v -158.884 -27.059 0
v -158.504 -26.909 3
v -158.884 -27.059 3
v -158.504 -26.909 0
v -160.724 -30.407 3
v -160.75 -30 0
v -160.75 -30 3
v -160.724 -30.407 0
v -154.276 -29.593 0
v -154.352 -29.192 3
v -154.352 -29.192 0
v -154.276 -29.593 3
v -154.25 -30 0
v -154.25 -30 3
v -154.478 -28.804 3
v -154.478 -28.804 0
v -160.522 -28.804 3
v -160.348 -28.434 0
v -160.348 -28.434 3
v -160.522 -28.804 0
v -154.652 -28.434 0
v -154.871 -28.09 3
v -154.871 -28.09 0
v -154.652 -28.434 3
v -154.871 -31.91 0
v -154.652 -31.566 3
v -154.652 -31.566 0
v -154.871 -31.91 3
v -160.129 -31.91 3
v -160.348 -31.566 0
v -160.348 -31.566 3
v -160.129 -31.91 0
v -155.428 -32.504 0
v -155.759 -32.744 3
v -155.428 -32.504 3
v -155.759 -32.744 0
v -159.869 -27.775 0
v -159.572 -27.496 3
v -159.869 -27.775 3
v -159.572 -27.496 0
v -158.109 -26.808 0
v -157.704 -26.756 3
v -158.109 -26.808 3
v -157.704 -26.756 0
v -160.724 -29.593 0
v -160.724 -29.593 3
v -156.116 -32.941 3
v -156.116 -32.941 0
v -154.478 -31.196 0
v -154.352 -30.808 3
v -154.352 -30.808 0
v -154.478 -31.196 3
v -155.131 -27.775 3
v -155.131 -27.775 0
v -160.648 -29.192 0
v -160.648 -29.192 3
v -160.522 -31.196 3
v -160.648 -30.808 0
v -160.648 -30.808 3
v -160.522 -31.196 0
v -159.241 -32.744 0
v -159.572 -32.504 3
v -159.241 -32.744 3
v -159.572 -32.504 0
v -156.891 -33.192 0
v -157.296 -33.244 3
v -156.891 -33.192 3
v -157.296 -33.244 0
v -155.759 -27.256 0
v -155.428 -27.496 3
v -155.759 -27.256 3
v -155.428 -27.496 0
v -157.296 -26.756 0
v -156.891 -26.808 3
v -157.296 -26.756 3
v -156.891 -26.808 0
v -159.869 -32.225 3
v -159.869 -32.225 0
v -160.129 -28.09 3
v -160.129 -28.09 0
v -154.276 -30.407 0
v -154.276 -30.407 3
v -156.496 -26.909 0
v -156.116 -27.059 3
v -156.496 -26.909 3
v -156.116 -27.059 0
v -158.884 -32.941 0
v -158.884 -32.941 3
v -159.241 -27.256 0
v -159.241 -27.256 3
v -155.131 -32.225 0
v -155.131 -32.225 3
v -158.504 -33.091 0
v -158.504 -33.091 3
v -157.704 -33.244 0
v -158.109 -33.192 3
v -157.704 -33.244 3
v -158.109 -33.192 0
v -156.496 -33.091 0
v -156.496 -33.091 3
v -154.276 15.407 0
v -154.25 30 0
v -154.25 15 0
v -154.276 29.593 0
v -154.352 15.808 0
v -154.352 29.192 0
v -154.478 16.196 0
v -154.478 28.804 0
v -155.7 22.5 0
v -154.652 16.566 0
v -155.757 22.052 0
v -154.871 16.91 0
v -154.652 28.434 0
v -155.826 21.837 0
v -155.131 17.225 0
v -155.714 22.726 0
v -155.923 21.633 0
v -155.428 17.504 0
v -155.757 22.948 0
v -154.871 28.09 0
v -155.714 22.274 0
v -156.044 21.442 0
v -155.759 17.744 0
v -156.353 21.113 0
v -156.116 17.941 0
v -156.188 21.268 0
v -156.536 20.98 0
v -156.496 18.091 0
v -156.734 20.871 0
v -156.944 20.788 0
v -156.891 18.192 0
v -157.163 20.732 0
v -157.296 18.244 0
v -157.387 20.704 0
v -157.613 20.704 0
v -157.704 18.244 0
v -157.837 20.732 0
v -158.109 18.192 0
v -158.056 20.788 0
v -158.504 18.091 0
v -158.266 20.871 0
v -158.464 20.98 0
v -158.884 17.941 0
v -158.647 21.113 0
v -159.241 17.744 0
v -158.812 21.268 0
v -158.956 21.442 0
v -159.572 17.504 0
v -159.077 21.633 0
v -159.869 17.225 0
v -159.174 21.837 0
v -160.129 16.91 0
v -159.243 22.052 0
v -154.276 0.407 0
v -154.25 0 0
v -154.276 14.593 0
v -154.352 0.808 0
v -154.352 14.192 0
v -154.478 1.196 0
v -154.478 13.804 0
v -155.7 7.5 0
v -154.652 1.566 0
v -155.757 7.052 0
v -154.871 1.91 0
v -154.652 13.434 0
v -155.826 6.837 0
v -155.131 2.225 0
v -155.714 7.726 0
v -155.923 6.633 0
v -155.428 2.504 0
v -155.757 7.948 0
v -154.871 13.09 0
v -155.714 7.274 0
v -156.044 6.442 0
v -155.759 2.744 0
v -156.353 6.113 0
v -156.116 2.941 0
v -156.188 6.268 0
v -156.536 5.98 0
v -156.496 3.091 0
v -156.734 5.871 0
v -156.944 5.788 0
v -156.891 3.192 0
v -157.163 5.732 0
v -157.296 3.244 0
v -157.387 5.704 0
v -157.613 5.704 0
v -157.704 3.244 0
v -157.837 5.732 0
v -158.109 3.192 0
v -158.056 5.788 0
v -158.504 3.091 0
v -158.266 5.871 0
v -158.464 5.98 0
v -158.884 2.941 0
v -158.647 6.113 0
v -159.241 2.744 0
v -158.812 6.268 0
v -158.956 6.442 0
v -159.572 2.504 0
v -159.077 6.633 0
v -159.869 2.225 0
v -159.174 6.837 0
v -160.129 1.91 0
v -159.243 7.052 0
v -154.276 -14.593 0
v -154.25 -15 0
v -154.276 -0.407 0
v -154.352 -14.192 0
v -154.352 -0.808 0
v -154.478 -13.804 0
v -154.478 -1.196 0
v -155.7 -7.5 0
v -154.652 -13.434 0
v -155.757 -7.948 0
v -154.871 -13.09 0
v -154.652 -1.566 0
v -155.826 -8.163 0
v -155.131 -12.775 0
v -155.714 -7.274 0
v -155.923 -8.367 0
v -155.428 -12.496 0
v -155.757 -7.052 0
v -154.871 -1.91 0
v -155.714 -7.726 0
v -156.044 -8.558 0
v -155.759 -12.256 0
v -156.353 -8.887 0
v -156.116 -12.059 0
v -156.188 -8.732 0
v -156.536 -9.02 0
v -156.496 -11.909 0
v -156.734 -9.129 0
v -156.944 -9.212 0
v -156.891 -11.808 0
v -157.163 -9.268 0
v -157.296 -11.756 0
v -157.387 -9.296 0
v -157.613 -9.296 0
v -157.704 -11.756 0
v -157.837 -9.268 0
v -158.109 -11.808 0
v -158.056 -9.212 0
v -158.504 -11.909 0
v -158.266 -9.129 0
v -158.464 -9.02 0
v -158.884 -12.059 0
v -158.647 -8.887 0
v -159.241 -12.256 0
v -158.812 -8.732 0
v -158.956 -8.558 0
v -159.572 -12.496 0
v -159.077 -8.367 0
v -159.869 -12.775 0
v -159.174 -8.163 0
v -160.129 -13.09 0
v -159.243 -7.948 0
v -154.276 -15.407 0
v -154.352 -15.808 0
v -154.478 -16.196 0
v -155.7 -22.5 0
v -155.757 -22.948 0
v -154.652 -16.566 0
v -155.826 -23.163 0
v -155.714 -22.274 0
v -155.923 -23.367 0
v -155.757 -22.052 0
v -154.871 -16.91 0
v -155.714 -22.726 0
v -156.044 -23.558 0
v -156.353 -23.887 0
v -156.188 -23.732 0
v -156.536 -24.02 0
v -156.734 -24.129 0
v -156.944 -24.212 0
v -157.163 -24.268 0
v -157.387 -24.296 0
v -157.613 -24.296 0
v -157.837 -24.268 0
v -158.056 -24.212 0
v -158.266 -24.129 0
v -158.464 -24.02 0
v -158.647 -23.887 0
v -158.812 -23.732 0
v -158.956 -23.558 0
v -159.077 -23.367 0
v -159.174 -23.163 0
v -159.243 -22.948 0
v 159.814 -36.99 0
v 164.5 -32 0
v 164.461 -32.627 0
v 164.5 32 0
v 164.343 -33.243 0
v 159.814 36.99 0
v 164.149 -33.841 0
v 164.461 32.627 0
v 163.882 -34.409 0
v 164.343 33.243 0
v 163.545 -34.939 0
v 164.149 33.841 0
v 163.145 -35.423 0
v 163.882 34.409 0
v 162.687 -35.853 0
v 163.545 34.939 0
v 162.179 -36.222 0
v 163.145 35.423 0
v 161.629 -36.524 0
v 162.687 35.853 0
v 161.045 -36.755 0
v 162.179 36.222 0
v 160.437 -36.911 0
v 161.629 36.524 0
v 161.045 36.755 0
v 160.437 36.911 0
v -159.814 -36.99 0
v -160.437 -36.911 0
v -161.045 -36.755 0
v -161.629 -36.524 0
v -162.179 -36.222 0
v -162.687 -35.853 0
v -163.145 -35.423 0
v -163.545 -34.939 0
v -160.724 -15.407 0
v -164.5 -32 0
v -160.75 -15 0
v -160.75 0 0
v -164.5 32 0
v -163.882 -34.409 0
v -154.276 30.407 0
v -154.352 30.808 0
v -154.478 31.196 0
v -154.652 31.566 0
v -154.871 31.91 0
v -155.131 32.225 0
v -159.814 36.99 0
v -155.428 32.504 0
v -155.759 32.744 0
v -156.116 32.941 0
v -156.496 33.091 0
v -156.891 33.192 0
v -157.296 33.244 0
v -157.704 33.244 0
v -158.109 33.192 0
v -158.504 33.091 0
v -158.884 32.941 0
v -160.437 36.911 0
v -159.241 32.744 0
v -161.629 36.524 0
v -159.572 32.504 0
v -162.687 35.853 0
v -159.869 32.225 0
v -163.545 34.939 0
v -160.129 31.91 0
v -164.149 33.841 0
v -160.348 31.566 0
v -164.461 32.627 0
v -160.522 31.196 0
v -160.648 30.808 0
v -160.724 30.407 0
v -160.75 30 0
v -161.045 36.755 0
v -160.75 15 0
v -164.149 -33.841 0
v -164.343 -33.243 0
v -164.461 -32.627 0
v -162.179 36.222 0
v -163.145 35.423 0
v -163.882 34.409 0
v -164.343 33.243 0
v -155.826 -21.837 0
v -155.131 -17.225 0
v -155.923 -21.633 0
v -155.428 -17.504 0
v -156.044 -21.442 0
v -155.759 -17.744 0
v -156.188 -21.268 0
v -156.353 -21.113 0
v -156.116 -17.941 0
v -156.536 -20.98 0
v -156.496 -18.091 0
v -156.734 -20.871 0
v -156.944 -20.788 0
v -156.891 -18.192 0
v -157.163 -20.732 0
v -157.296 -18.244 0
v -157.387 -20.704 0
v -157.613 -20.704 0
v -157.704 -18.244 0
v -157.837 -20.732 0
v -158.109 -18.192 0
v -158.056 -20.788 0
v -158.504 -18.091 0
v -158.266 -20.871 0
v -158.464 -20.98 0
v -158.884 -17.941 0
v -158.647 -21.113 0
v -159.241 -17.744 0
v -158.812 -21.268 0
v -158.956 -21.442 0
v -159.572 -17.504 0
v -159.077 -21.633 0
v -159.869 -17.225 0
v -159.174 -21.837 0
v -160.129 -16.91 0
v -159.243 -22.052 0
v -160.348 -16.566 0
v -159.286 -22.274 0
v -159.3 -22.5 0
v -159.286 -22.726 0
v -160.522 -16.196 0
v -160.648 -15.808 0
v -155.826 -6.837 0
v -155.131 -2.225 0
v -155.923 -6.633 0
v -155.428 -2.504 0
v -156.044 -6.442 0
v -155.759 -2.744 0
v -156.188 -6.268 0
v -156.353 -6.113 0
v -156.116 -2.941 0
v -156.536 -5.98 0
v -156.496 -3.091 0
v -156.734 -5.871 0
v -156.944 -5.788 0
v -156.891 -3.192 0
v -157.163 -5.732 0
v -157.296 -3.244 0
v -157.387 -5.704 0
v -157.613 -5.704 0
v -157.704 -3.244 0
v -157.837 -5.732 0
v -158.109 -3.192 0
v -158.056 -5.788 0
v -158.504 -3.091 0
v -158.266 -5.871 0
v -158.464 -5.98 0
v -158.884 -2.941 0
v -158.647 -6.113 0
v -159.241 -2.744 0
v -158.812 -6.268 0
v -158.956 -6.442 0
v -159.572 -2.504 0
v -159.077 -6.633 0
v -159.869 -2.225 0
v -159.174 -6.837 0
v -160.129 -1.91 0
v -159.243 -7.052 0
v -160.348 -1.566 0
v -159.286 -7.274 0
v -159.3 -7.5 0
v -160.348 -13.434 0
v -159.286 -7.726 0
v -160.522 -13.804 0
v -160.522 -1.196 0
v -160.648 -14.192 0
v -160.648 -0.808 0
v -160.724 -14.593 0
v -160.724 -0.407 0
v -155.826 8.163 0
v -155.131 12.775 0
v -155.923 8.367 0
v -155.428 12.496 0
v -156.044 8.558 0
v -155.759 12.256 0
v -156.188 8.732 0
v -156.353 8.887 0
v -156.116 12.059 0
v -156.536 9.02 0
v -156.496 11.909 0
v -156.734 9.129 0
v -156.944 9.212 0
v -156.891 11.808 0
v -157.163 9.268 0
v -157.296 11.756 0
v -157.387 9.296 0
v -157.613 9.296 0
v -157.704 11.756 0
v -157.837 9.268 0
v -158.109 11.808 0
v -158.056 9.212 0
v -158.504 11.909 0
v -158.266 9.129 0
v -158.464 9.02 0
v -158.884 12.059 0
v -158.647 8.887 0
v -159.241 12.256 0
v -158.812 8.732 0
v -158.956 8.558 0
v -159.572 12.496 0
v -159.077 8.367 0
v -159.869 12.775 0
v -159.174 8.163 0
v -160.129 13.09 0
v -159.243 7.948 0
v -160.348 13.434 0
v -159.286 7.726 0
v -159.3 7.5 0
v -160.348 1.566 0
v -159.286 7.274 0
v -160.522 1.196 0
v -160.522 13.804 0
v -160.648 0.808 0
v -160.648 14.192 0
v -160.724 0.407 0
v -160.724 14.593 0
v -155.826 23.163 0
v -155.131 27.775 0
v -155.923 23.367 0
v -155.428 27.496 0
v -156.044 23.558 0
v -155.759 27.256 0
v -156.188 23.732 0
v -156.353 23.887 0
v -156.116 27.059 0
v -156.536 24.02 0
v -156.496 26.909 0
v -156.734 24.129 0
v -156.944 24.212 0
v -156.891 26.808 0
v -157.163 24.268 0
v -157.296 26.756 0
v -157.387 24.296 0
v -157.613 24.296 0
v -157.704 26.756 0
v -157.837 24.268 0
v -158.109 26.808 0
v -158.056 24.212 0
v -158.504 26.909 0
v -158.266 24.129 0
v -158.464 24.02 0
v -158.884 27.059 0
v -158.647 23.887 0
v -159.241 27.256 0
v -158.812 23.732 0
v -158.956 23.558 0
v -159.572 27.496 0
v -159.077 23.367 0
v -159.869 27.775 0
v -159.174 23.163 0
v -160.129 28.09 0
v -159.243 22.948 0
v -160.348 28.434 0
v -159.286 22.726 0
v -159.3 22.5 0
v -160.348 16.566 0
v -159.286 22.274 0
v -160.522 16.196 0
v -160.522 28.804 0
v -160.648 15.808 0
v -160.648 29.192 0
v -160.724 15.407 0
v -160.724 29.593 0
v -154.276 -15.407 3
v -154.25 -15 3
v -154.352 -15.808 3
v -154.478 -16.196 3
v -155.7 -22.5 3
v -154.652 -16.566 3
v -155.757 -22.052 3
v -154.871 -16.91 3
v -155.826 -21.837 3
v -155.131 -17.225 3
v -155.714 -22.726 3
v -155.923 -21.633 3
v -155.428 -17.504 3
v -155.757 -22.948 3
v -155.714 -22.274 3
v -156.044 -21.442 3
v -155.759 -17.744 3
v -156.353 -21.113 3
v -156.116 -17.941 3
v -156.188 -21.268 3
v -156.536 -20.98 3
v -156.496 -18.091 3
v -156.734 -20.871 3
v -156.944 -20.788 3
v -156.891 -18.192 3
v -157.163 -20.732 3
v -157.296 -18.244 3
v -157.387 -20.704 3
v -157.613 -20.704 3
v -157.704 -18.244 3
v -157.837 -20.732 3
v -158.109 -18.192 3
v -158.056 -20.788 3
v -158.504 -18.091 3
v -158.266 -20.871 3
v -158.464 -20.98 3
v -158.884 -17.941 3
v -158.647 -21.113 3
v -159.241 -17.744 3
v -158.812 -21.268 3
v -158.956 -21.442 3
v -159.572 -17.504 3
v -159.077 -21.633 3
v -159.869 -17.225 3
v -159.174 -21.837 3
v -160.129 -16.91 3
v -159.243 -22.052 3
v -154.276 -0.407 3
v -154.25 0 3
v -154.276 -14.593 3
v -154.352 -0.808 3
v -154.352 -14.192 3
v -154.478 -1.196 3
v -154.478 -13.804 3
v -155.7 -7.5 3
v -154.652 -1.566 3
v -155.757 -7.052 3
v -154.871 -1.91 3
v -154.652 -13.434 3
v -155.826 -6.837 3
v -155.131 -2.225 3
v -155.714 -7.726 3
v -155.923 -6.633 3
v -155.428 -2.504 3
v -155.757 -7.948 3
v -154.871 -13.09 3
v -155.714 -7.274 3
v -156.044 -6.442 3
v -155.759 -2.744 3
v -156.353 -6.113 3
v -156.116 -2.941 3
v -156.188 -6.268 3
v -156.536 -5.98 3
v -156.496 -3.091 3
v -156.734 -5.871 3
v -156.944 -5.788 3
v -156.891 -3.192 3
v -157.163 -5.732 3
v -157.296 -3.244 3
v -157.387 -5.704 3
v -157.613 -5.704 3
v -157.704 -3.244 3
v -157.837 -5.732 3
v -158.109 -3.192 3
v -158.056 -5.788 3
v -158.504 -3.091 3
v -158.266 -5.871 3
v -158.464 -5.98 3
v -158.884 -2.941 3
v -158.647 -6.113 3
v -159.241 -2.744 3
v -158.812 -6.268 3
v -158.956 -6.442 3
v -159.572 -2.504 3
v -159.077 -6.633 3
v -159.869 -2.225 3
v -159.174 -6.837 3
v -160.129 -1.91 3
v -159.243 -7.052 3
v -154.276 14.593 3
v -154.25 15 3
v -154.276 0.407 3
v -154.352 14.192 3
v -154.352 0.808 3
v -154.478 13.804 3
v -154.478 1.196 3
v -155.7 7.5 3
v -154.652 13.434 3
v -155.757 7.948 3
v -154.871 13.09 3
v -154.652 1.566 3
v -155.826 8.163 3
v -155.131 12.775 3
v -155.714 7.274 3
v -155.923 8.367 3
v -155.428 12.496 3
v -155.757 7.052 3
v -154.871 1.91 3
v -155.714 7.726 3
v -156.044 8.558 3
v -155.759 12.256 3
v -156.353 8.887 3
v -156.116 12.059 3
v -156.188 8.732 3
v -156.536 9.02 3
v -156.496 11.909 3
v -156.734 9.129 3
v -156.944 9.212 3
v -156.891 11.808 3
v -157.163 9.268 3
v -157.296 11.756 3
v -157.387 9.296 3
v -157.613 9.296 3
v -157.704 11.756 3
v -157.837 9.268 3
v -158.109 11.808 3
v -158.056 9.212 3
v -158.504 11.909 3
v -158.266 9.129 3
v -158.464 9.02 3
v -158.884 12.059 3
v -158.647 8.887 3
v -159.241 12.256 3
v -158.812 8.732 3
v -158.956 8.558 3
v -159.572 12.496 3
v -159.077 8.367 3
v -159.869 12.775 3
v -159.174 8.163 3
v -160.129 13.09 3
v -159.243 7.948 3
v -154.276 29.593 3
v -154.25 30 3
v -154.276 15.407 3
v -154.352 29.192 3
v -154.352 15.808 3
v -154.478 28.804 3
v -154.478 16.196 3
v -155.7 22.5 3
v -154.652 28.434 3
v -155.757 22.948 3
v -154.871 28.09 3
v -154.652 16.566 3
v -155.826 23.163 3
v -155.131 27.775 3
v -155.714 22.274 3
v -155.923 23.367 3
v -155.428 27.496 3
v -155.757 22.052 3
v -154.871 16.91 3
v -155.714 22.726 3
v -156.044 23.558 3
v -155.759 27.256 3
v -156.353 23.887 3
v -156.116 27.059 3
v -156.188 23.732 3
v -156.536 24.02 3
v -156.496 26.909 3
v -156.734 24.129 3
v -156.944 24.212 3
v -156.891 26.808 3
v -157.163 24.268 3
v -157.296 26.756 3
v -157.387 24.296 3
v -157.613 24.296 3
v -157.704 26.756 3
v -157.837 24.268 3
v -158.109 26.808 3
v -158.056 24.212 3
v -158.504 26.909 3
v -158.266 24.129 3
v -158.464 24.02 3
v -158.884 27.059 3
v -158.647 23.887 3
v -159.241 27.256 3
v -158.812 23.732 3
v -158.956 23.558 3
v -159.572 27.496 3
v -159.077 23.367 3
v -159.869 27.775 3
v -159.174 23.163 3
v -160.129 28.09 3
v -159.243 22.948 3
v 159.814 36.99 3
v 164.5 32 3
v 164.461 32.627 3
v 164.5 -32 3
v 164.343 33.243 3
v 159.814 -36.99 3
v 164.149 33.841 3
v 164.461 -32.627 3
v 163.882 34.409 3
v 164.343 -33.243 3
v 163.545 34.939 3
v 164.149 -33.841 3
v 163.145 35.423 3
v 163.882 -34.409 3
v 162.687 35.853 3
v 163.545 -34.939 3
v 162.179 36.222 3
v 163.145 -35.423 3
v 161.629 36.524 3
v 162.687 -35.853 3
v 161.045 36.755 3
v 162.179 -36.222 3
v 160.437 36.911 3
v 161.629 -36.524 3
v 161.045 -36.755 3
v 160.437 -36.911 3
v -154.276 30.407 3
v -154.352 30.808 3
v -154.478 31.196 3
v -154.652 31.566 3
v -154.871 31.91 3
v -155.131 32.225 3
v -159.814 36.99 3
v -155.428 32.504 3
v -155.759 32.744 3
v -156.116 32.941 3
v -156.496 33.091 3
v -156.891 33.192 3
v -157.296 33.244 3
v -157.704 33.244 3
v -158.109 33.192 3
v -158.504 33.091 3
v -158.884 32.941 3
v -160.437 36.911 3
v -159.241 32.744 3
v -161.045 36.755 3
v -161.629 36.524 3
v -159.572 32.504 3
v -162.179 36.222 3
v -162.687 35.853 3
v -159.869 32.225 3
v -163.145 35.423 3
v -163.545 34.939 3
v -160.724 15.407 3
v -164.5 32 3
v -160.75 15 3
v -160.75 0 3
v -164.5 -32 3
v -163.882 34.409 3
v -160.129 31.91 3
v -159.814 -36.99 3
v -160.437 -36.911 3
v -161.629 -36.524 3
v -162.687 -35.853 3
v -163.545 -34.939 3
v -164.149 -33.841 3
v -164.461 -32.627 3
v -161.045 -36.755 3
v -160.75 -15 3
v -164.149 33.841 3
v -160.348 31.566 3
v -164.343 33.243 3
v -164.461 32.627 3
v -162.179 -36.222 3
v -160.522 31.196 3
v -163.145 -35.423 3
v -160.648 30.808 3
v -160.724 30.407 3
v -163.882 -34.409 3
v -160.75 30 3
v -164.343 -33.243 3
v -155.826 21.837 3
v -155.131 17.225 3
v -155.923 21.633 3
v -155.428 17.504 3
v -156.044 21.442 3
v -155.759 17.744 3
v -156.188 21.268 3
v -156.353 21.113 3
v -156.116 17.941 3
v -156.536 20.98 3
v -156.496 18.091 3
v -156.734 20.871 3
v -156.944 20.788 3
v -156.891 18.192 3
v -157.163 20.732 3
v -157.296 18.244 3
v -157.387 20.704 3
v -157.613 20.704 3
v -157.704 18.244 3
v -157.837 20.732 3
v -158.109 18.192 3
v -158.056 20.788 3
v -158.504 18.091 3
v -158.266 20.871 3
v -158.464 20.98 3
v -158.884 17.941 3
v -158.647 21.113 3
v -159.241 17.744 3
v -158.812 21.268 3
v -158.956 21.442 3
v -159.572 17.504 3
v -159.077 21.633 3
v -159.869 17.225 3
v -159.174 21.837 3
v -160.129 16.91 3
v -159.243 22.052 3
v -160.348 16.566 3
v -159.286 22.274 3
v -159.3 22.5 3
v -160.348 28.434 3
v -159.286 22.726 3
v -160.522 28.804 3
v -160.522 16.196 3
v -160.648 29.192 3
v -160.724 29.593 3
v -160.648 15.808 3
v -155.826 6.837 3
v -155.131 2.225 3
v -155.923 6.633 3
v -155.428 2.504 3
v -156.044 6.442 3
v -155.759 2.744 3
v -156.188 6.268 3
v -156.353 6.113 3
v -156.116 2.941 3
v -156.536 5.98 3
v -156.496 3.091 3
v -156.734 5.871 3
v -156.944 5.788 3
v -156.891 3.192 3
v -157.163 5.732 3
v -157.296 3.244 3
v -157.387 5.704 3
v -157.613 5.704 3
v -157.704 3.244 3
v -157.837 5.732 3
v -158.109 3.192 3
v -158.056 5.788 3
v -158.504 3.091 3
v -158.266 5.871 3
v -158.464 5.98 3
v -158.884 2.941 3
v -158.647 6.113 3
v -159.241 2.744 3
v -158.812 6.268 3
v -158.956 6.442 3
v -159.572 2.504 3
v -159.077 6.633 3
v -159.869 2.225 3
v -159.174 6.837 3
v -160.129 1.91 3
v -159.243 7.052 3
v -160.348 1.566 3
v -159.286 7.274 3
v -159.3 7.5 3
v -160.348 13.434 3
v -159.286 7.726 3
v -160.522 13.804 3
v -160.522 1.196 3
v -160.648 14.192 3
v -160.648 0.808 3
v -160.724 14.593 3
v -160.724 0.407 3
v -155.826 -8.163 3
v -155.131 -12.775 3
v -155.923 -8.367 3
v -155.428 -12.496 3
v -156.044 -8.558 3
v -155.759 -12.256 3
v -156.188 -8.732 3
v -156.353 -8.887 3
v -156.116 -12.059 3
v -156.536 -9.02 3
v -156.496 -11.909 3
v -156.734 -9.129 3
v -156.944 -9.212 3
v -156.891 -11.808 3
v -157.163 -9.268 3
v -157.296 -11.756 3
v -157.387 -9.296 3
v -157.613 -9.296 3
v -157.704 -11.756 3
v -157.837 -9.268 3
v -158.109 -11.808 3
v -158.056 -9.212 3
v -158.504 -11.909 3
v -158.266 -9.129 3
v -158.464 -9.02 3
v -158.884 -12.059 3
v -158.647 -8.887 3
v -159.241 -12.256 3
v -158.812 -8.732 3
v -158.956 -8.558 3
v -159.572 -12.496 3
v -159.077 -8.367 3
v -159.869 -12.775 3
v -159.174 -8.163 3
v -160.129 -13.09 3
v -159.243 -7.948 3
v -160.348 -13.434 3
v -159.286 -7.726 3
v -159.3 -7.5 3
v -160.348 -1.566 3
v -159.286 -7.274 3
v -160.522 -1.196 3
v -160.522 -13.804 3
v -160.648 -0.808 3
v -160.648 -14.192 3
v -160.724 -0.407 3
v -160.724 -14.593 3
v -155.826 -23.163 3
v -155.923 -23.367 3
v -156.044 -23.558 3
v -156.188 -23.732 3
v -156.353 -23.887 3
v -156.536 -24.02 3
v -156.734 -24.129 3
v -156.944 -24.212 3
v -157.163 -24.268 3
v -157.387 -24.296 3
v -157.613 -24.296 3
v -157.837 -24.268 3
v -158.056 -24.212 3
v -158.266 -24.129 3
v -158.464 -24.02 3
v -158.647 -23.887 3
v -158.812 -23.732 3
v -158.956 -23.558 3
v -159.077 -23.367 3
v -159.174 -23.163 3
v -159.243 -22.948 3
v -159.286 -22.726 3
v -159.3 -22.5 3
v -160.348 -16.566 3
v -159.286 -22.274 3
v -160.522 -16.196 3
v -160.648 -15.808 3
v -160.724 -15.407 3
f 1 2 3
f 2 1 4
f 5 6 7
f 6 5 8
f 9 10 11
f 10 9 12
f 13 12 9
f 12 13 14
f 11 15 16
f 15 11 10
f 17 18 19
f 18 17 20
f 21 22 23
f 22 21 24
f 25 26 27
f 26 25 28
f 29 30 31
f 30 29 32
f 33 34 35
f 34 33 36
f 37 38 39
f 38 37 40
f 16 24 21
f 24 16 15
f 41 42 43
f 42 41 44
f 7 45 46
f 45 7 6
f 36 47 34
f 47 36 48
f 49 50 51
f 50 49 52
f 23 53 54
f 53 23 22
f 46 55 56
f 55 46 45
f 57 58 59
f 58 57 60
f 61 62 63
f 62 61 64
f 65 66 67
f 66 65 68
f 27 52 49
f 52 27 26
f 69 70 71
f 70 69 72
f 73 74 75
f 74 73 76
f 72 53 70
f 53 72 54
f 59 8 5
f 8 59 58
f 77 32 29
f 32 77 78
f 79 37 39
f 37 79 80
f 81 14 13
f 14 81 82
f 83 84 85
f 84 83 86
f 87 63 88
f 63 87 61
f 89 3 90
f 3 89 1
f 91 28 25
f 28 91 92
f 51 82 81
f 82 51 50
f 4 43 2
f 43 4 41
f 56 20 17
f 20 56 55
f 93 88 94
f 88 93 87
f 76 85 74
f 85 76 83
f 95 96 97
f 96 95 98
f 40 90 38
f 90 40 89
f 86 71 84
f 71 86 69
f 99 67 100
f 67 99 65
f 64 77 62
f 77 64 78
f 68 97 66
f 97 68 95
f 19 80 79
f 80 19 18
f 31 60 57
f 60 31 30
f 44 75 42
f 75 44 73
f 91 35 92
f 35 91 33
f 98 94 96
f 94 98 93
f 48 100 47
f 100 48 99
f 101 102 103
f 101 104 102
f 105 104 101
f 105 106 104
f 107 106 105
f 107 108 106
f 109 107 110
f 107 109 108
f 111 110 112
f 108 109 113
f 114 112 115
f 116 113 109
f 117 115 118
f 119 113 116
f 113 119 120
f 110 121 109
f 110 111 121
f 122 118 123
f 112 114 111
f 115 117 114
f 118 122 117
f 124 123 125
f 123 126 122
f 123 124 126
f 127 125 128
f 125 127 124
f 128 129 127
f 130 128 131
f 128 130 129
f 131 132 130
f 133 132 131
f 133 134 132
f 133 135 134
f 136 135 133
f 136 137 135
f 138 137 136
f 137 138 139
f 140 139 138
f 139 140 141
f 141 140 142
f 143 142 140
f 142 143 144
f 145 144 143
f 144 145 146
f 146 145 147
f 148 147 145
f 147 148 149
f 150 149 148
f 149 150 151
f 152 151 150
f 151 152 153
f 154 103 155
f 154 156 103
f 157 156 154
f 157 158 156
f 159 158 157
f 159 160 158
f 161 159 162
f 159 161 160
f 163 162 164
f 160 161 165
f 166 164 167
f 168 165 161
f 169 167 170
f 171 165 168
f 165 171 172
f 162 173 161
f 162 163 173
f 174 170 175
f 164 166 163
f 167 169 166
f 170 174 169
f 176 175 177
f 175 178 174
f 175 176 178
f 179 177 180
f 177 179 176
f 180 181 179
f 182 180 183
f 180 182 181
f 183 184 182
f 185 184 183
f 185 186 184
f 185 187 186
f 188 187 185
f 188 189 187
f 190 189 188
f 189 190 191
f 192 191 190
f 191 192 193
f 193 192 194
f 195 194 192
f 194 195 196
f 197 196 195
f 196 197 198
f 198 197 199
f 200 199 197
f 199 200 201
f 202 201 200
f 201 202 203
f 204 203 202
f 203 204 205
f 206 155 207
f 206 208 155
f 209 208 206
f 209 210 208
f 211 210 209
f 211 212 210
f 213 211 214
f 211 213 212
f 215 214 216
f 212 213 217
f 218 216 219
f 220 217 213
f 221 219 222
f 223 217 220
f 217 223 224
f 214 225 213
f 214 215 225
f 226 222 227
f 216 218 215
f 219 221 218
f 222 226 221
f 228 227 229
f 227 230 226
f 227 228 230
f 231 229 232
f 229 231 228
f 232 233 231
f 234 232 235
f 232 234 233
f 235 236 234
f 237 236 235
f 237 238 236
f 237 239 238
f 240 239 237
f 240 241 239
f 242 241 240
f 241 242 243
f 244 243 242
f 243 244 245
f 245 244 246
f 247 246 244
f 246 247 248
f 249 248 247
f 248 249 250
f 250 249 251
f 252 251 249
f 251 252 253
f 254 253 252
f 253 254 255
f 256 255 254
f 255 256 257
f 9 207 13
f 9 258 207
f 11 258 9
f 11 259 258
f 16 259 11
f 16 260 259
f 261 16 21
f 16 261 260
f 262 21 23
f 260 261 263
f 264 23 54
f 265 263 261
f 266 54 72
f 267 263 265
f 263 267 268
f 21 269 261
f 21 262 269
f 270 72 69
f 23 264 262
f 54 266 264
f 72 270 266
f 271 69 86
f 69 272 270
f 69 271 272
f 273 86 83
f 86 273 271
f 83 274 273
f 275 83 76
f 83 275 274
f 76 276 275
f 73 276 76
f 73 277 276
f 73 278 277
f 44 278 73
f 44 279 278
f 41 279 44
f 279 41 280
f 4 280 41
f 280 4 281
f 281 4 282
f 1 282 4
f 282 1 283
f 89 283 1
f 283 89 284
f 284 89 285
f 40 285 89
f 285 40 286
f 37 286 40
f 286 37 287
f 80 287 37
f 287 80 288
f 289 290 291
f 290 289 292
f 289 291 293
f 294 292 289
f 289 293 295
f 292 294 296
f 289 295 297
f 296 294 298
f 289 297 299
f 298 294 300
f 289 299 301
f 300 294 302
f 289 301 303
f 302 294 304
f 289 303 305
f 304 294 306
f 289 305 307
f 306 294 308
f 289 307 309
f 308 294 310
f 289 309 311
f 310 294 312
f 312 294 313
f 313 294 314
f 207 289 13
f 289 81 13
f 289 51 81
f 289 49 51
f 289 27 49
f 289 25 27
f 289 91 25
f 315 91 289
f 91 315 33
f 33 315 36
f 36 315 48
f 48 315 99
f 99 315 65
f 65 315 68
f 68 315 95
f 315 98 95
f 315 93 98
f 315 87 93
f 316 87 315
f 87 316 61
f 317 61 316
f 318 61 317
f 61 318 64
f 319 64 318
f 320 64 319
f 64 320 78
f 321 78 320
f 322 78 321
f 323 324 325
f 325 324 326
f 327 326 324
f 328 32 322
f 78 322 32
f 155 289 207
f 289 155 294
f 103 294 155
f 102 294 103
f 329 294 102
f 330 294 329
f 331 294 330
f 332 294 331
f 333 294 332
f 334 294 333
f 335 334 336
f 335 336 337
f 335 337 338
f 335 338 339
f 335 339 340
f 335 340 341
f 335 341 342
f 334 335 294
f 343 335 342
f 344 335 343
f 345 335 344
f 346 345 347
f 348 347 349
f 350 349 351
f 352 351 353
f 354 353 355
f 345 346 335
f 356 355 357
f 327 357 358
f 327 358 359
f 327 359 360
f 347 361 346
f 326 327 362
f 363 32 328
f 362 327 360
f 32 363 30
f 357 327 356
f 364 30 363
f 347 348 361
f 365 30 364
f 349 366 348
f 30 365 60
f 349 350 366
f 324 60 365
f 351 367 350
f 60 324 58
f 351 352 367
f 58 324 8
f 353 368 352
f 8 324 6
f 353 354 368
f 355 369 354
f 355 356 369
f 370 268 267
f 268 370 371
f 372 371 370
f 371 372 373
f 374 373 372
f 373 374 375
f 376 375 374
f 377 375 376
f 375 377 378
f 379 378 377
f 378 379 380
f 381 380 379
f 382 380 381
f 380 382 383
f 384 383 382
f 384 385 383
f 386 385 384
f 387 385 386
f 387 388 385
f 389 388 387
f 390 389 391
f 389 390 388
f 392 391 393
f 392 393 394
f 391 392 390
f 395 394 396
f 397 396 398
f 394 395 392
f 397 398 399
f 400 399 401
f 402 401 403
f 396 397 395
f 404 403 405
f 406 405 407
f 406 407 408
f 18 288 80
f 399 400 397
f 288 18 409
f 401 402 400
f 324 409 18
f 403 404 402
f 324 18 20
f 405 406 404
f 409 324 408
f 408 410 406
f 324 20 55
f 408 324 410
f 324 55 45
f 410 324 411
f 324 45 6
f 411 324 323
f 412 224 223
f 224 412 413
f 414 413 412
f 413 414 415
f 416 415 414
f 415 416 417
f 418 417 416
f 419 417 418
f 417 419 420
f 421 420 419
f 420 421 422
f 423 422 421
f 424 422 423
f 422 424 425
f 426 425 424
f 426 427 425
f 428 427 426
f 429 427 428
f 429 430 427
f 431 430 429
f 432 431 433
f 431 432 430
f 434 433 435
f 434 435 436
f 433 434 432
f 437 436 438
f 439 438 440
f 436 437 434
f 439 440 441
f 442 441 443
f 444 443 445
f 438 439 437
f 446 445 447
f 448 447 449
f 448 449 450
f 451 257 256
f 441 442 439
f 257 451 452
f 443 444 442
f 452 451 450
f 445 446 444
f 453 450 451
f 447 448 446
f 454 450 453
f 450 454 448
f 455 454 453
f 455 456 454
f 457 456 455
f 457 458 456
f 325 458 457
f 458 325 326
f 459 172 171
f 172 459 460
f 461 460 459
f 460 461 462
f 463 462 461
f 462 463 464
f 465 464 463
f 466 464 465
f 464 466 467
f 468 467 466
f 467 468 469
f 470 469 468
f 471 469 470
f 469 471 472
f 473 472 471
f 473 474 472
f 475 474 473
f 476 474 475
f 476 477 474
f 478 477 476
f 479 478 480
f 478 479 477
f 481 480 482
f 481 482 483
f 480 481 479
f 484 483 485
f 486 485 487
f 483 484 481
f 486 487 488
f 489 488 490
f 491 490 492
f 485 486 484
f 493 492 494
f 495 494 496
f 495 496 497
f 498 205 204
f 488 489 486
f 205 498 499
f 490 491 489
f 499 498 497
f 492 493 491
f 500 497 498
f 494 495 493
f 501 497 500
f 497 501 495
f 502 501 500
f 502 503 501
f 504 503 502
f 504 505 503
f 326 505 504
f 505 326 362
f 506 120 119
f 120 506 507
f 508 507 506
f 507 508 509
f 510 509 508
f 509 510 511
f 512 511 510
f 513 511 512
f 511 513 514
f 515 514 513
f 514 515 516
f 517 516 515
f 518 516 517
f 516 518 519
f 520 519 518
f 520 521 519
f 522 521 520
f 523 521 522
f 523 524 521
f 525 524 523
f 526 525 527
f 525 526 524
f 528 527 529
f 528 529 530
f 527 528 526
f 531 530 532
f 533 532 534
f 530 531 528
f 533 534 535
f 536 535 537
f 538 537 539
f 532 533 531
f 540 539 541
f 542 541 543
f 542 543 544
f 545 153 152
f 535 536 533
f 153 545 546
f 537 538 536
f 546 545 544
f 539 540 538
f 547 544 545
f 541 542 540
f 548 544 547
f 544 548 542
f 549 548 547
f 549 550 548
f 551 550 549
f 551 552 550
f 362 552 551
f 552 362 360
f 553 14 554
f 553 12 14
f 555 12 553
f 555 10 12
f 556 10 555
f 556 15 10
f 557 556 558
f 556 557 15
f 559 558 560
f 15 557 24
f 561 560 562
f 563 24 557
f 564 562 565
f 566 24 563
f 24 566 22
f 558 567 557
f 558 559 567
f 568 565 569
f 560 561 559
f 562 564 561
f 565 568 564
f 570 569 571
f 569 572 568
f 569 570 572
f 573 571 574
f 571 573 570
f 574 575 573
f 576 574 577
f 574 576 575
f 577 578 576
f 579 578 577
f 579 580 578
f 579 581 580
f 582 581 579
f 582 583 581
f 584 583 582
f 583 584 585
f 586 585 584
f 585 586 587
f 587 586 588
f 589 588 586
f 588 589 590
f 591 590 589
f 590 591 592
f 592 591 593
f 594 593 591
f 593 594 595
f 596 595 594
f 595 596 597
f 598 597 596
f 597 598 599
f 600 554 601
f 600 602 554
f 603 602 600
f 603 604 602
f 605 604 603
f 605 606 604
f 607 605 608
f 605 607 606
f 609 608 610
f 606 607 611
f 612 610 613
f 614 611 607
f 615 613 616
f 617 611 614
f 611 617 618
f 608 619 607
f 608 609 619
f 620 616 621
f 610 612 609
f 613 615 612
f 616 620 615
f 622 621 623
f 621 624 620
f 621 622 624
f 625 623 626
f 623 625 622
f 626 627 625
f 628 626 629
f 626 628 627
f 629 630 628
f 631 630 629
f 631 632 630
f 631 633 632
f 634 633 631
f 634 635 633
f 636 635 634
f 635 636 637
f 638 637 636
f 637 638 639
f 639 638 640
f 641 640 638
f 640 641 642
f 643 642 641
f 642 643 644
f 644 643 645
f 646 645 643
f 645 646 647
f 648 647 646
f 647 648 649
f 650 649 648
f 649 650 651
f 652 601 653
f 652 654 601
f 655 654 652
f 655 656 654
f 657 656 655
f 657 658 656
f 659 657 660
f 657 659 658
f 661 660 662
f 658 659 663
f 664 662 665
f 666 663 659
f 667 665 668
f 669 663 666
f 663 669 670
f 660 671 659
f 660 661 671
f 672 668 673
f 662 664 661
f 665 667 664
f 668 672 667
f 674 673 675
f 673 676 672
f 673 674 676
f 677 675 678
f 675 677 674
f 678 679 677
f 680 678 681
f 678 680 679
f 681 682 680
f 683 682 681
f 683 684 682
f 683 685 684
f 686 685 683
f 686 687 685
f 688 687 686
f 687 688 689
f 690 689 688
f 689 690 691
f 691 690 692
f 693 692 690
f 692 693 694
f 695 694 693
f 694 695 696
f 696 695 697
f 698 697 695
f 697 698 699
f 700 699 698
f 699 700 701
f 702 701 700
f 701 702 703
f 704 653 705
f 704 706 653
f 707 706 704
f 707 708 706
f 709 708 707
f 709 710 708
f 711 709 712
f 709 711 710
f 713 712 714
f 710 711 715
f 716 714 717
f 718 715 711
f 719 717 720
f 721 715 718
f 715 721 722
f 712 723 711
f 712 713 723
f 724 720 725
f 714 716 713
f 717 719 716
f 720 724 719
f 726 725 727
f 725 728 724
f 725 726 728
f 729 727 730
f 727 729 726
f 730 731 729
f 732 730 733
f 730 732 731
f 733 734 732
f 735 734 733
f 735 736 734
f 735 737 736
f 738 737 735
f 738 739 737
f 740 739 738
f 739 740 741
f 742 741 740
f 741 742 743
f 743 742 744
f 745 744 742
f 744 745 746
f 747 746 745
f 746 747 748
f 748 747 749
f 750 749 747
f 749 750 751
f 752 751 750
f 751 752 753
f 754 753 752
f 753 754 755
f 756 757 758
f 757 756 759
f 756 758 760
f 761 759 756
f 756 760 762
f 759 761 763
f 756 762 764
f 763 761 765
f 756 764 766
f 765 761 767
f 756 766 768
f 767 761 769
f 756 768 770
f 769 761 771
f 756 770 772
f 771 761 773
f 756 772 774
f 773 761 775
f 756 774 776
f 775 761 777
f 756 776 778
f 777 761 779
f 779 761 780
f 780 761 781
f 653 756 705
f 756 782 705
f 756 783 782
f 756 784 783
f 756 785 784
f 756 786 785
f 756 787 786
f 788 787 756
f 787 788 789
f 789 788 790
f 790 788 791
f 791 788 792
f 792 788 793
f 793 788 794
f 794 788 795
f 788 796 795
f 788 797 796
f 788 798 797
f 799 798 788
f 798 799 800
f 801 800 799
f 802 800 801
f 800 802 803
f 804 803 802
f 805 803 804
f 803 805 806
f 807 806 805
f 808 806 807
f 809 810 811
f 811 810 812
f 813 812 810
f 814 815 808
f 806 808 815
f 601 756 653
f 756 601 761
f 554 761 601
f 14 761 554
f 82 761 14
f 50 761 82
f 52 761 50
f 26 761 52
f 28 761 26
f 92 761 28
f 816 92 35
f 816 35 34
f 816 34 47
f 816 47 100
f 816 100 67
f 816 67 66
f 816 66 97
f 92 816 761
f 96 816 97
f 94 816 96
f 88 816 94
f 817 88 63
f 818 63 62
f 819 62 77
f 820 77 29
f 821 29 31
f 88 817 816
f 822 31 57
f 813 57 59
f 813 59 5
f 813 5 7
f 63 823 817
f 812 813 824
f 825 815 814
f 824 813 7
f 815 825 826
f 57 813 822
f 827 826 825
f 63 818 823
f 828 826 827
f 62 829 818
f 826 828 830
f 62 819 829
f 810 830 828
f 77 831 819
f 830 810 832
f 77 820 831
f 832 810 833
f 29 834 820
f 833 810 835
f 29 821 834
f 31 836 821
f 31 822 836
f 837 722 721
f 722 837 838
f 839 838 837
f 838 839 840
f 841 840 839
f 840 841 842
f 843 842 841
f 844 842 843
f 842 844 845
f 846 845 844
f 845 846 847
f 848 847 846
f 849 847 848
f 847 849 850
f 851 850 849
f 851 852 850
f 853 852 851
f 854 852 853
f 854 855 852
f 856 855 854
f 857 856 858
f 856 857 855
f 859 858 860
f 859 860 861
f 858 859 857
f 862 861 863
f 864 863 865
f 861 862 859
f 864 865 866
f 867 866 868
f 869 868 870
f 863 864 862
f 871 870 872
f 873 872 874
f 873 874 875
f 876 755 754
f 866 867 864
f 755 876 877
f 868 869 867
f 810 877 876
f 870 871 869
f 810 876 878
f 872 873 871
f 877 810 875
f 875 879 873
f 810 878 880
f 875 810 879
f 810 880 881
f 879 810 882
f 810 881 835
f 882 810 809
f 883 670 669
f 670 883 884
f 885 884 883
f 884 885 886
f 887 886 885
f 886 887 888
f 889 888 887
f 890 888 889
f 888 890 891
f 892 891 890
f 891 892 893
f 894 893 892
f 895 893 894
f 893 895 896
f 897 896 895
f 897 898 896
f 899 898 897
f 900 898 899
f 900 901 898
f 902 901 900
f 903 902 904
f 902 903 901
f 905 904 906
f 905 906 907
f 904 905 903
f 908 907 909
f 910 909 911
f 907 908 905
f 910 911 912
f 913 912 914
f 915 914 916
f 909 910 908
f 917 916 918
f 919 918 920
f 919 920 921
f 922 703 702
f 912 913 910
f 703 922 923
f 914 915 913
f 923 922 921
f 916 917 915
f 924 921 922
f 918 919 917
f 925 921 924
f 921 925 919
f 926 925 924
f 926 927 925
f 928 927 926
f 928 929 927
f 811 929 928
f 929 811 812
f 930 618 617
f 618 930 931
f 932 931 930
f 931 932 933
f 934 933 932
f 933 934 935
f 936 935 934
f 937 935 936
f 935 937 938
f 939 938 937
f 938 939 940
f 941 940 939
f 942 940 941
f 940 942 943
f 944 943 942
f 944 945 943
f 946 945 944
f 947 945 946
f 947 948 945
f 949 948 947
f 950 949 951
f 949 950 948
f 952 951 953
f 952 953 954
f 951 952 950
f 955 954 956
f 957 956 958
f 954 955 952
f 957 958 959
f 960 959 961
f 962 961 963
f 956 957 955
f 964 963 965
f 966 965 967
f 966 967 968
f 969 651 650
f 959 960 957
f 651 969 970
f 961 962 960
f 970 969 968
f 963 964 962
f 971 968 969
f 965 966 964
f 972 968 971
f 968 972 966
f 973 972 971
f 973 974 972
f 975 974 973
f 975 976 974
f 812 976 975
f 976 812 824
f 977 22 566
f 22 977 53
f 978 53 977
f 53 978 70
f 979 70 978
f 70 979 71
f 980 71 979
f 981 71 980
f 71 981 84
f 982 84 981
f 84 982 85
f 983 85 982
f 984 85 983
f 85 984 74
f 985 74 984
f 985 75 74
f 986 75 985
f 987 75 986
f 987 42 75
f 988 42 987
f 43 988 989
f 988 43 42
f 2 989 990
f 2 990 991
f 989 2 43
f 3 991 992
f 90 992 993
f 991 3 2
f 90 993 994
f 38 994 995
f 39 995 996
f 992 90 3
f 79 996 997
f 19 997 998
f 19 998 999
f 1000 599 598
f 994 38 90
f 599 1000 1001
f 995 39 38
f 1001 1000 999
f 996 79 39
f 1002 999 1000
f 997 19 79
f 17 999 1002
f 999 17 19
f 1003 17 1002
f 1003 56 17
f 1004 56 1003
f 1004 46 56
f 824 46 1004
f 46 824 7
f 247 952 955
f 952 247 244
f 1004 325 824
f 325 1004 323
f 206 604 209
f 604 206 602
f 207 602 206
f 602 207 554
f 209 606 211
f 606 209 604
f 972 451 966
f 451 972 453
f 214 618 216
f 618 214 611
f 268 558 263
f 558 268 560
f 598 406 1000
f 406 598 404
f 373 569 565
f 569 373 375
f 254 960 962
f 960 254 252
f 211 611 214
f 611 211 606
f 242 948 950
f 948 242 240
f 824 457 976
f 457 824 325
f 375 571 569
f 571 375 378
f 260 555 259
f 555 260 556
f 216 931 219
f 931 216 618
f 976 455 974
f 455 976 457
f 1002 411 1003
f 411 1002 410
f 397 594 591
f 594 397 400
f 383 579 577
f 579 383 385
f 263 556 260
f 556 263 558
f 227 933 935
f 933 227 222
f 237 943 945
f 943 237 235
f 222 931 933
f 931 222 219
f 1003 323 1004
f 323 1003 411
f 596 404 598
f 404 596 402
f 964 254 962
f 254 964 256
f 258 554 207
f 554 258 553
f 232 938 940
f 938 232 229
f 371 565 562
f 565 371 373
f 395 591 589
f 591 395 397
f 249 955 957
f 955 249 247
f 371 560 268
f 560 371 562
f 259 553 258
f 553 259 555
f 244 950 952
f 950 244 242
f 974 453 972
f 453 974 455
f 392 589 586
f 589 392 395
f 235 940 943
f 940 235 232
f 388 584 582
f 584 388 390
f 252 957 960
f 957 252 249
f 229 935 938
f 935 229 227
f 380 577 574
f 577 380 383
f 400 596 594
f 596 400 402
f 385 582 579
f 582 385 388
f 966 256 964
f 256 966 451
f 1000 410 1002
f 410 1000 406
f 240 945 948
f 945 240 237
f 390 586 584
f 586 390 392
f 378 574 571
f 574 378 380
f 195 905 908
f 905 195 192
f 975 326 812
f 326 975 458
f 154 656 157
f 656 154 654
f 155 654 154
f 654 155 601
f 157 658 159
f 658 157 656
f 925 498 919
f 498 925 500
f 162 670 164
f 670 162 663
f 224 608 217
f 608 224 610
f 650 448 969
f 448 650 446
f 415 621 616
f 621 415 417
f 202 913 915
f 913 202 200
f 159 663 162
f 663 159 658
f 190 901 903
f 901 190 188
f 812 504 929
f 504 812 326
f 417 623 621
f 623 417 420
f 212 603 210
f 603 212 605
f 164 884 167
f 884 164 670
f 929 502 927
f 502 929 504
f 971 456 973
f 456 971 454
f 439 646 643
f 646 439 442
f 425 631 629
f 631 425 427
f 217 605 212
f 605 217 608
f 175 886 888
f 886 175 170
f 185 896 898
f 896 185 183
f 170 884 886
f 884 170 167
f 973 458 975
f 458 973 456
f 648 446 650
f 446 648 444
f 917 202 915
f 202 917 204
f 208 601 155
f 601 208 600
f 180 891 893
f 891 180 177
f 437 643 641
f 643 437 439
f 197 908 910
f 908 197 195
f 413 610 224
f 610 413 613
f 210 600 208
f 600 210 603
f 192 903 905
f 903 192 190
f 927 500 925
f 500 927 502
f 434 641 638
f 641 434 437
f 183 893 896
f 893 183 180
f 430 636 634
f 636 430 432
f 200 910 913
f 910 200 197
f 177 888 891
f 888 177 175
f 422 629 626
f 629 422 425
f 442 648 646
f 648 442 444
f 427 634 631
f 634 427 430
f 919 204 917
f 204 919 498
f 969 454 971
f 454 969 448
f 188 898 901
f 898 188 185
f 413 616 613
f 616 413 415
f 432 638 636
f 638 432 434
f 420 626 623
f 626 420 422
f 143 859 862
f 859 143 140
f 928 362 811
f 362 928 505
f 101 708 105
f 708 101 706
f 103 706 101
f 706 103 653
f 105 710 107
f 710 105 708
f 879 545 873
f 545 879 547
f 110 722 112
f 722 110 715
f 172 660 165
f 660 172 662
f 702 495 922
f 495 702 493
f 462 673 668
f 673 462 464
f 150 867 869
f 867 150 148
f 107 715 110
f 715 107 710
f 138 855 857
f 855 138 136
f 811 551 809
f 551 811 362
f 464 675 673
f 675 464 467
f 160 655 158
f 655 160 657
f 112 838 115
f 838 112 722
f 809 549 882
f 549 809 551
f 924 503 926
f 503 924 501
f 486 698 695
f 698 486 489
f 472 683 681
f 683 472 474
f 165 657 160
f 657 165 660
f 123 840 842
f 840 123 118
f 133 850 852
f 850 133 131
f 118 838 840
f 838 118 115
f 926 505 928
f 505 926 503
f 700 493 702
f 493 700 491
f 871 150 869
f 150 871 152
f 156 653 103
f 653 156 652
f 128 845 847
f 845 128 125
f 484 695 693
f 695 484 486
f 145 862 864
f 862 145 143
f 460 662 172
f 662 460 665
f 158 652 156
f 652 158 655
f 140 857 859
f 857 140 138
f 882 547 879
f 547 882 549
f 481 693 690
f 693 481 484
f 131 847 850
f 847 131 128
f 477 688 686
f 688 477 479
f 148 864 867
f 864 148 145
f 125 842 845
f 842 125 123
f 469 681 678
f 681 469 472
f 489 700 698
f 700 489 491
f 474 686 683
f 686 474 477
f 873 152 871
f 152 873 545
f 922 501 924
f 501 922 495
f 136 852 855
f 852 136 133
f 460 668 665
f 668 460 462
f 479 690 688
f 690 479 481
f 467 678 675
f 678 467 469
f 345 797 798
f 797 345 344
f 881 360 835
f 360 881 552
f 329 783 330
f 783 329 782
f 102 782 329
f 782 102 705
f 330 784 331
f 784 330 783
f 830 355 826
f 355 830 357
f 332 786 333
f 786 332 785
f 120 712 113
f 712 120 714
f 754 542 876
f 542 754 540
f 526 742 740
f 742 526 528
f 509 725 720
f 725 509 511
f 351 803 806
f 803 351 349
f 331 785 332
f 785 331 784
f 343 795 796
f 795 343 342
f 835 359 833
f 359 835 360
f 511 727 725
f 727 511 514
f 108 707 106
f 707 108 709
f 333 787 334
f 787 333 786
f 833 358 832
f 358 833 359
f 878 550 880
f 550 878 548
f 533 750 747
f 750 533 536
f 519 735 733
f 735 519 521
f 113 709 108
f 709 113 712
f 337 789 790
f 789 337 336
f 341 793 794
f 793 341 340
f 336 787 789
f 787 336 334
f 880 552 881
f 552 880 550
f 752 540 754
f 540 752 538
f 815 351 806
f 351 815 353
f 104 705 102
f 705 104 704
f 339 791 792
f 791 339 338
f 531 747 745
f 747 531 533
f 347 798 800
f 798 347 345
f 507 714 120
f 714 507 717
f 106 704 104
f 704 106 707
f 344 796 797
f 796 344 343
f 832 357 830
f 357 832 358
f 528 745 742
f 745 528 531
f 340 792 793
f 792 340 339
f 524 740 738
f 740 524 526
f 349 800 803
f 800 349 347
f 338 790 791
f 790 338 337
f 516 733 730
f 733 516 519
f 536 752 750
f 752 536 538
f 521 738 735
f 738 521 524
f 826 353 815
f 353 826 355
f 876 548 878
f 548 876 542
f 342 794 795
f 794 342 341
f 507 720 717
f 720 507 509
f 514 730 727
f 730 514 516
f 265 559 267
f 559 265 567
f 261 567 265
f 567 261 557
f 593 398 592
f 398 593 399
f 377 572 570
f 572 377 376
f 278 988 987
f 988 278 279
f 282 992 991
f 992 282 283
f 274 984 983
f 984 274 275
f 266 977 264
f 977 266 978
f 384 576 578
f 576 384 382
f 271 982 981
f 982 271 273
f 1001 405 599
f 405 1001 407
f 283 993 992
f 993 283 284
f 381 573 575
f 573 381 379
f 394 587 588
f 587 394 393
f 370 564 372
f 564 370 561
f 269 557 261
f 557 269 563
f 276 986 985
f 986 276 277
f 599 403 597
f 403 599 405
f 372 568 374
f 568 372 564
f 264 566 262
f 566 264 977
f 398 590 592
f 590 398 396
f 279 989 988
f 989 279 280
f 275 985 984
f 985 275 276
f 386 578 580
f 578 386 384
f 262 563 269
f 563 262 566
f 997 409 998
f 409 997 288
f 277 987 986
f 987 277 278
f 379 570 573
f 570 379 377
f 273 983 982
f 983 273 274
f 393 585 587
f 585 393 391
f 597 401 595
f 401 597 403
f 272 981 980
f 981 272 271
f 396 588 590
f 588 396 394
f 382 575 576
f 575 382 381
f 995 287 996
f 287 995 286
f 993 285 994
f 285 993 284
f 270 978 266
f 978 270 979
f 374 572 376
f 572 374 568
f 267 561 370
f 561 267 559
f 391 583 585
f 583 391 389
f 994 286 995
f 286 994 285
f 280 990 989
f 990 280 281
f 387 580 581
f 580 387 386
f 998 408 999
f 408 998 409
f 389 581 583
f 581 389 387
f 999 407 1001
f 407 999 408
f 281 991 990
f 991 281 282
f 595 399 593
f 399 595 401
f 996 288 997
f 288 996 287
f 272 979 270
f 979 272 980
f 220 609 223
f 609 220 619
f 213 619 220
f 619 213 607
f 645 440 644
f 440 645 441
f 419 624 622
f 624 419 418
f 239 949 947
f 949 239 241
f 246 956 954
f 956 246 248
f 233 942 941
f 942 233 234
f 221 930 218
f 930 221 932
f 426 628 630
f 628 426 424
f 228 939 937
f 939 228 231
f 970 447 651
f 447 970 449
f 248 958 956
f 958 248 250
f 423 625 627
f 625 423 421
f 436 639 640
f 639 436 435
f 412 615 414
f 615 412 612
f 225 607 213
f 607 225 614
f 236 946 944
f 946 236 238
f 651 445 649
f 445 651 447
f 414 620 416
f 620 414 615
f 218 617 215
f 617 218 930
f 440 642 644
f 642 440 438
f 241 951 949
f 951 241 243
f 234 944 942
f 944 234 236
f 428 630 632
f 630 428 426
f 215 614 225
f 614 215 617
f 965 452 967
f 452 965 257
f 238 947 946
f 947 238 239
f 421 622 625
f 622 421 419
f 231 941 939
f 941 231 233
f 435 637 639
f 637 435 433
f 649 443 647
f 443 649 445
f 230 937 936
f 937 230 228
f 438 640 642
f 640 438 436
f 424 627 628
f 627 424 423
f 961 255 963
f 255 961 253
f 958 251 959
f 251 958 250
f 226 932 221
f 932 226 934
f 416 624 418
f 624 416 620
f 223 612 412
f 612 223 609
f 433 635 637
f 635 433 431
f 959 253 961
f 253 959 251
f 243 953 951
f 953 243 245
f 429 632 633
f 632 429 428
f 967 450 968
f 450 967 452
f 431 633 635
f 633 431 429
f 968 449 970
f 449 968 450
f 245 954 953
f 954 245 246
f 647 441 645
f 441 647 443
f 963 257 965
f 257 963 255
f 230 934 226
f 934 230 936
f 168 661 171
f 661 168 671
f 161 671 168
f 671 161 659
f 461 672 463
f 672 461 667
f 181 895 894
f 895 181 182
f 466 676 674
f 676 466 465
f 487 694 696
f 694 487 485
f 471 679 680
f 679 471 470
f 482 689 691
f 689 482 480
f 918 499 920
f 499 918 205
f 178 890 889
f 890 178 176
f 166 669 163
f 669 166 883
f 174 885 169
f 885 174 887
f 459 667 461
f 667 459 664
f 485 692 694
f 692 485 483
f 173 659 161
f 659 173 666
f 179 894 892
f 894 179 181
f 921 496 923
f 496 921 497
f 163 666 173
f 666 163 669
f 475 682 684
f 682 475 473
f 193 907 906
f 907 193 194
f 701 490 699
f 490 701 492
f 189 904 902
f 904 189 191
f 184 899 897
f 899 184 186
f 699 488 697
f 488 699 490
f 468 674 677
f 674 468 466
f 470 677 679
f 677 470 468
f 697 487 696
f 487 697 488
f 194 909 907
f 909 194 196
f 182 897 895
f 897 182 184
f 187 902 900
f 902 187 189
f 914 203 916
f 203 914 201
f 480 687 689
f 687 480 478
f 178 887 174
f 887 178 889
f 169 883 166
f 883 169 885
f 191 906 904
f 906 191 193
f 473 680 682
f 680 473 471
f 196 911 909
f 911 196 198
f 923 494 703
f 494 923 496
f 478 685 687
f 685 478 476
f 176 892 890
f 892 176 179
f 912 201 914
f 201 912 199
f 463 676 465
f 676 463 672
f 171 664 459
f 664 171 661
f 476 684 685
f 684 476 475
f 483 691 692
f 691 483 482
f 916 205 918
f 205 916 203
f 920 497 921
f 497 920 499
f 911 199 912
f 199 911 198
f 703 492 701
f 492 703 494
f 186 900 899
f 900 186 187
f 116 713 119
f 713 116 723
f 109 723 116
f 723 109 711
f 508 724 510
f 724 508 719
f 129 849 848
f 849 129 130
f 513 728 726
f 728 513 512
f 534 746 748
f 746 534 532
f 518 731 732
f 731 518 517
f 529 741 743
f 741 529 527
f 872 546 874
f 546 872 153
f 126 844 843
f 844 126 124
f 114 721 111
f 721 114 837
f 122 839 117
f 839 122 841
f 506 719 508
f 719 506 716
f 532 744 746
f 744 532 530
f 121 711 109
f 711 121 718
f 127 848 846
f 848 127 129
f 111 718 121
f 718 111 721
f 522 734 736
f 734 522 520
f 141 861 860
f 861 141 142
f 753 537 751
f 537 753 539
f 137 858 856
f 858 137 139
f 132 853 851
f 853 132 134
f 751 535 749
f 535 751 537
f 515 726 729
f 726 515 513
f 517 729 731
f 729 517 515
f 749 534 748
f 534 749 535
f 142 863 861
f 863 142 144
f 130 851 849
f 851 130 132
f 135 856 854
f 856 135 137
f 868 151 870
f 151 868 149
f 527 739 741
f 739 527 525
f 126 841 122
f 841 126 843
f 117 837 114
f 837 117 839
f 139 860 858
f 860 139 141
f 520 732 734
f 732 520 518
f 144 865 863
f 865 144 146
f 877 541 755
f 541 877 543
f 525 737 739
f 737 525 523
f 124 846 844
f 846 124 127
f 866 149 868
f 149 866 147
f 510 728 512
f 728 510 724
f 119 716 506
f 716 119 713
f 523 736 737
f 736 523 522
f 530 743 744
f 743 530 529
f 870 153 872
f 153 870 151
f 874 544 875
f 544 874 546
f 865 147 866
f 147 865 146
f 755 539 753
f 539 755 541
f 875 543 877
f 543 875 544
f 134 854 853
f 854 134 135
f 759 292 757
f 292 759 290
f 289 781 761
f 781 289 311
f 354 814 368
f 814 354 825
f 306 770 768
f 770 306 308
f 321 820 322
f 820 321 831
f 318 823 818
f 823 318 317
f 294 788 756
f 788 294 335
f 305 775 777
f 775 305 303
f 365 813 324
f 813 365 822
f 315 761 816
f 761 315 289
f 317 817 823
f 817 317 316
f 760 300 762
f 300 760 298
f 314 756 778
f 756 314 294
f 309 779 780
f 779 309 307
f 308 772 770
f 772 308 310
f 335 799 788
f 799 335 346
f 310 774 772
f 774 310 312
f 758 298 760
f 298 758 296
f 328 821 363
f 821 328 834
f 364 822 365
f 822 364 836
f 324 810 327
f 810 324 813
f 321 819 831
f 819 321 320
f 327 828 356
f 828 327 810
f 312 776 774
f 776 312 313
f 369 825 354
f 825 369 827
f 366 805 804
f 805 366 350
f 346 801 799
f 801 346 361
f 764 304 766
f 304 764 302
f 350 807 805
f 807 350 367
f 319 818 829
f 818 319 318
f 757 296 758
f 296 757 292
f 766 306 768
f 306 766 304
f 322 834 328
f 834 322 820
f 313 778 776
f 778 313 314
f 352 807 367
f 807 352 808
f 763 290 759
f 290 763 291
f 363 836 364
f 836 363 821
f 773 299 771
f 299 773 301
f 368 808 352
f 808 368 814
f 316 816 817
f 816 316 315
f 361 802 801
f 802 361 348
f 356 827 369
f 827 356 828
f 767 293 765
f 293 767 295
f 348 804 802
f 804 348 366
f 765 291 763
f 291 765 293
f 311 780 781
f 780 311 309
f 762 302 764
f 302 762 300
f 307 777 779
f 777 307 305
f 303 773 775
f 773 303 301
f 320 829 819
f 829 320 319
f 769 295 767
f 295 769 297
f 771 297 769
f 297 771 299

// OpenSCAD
$fn = 50;


difference() {
	union() {
		hull() {
			translate(v = [-159.5000000000, 32.0000000000, 0]) {
				cylinder(h = 3, r = 5);
			}
			translate(v = [159.5000000000, 32.0000000000, 0]) {
				cylinder(h = 3, r = 5);
			}
			translate(v = [-159.5000000000, -32.0000000000, 0]) {
				cylinder(h = 3, r = 5);
			}
			translate(v = [159.5000000000, -32.0000000000, 0]) {
				cylinder(h = 3, r = 5);
			}
		}
	}
	union() {
		translate(v = [-157.5000000000, -30.0000000000, 0]) {
			cylinder(h = 3, r = 3.2500000000);
		}
		translate(v = [-157.5000000000, -15.0000000000, 0]) {
			cylinder(h = 3, r = 3.2500000000);
		}
		translate(v = [-157.5000000000, 0.0000000000, 0]) {
			cylinder(h = 3, r = 3.2500000000);
		}
		translate(v = [-157.5000000000, 15.0000000000, 0]) {
			cylinder(h = 3, r = 3.2500000000);
		}
		translate(v = [-157.5000000000, 30.0000000000, 0]) {
			cylinder(h = 3, r = 3.2500000000);
		}
		translate(v = [-157.5000000000, -30.0000000000, 0]) {
			cylinder(h = 3, r = 1.8000000000);
		}
		translate(v = [-157.5000000000, -22.5000000000, 0]) {
			cylinder(h = 3, r = 1.8000000000);
		}
		translate(v = [-157.5000000000, -15.0000000000, 0]) {
			cylinder(h = 3, r = 1.8000000000);
		}
		translate(v = [-157.5000000000, -7.5000000000, 0]) {
			cylinder(h = 3, r = 1.8000000000);
		}
		translate(v = [-157.5000000000, 0.0000000000, 0]) {
			cylinder(h = 3, r = 1.8000000000);
		}
		translate(v = [-157.5000000000, 7.5000000000, 0]) {
			cylinder(h = 3, r = 1.8000000000);
		}
		translate(v = [-157.5000000000, 15.0000000000, 0]) {
			cylinder(h = 3, r = 1.8000000000);
		}
		translate(v = [-157.5000000000, 22.5000000000, 0]) {
			cylinder(h = 3, r = 1.8000000000);
		}
		translate(v = [-157.5000000000, 30.0000000000, 0]) {
			cylinder(h = 3, r = 1.8000000000);
		}
		translate(v = [-157.5000000000, -30.0000000000, 0]) {
			cylinder(h = 3, r = 1.8000000000);
		}
		translate(v = [-157.5000000000, -22.5000000000, 0]) {
			cylinder(h = 3, r = 1.8000000000);
		}
		translate(v = [-157.5000000000, -15.0000000000, 0]) {
			cylinder(h = 3, r = 1.8000000000);
		}
		translate(v = [-157.5000000000, -7.5000000000, 0]) {
			cylinder(h = 3, r = 1.8000000000);
		}
		translate(v = [-157.5000000000, 0.0000000000, 0]) {
			cylinder(h = 3, r = 1.8000000000);
		}
		translate(v = [-157.5000000000, 7.5000000000, 0]) {
			cylinder(h = 3, r = 1.8000000000);
		}
		translate(v = [-157.5000000000, 15.0000000000, 0]) {
			cylinder(h = 3, r = 1.8000000000);
		}
		translate(v = [-157.5000000000, 22.5000000000, 0]) {
			cylinder(h = 3, r = 1.8000000000);
		}
		translate(v = [-157.5000000000, 30.0000000000, 0]) {
			cylinder(h = 3, r = 1.8000000000);
		}
		translate(v = [-157.5000000000, -30.0000000000, 0]) {
			cylinder(h = 3, r = 1.8000000000);
		}
		translate(v = [-157.5000000000, -22.5000000000, 0]) {
			cylinder(h = 3, r = 1.8000000000);
		}
		translate(v = [-157.5000000000, -15.0000000000, 0]) {
			cylinder(h = 3, r = 1.8000000000);
		}
		translate(v = [-157.5000000000, -7.5000000000, 0]) {
			cylinder(h = 3, r = 1.8000000000);
		}
		translate(v = [-157.5000000000, 0.0000000000, 0]) {
			cylinder(h = 3, r = 1.8000000000);
		}
		translate(v = [-157.5000000000, 7.5000000000, 0]) {
			cylinder(h = 3, r = 1.8000000000);
		}
		translate(v = [-157.5000000000, 15.0000000000, 0]) {
			cylinder(h = 3, r = 1.8000000000);
		}
		translate(v = [-157.5000000000, 22.5000000000, 0]) {
			cylinder(h = 3, r = 1.8000000000);
		}
		translate(v = [-157.5000000000, 30.0000000000, 0]) {
			cylinder(h = 3, r = 1.8000000000);
		}
	}
}
